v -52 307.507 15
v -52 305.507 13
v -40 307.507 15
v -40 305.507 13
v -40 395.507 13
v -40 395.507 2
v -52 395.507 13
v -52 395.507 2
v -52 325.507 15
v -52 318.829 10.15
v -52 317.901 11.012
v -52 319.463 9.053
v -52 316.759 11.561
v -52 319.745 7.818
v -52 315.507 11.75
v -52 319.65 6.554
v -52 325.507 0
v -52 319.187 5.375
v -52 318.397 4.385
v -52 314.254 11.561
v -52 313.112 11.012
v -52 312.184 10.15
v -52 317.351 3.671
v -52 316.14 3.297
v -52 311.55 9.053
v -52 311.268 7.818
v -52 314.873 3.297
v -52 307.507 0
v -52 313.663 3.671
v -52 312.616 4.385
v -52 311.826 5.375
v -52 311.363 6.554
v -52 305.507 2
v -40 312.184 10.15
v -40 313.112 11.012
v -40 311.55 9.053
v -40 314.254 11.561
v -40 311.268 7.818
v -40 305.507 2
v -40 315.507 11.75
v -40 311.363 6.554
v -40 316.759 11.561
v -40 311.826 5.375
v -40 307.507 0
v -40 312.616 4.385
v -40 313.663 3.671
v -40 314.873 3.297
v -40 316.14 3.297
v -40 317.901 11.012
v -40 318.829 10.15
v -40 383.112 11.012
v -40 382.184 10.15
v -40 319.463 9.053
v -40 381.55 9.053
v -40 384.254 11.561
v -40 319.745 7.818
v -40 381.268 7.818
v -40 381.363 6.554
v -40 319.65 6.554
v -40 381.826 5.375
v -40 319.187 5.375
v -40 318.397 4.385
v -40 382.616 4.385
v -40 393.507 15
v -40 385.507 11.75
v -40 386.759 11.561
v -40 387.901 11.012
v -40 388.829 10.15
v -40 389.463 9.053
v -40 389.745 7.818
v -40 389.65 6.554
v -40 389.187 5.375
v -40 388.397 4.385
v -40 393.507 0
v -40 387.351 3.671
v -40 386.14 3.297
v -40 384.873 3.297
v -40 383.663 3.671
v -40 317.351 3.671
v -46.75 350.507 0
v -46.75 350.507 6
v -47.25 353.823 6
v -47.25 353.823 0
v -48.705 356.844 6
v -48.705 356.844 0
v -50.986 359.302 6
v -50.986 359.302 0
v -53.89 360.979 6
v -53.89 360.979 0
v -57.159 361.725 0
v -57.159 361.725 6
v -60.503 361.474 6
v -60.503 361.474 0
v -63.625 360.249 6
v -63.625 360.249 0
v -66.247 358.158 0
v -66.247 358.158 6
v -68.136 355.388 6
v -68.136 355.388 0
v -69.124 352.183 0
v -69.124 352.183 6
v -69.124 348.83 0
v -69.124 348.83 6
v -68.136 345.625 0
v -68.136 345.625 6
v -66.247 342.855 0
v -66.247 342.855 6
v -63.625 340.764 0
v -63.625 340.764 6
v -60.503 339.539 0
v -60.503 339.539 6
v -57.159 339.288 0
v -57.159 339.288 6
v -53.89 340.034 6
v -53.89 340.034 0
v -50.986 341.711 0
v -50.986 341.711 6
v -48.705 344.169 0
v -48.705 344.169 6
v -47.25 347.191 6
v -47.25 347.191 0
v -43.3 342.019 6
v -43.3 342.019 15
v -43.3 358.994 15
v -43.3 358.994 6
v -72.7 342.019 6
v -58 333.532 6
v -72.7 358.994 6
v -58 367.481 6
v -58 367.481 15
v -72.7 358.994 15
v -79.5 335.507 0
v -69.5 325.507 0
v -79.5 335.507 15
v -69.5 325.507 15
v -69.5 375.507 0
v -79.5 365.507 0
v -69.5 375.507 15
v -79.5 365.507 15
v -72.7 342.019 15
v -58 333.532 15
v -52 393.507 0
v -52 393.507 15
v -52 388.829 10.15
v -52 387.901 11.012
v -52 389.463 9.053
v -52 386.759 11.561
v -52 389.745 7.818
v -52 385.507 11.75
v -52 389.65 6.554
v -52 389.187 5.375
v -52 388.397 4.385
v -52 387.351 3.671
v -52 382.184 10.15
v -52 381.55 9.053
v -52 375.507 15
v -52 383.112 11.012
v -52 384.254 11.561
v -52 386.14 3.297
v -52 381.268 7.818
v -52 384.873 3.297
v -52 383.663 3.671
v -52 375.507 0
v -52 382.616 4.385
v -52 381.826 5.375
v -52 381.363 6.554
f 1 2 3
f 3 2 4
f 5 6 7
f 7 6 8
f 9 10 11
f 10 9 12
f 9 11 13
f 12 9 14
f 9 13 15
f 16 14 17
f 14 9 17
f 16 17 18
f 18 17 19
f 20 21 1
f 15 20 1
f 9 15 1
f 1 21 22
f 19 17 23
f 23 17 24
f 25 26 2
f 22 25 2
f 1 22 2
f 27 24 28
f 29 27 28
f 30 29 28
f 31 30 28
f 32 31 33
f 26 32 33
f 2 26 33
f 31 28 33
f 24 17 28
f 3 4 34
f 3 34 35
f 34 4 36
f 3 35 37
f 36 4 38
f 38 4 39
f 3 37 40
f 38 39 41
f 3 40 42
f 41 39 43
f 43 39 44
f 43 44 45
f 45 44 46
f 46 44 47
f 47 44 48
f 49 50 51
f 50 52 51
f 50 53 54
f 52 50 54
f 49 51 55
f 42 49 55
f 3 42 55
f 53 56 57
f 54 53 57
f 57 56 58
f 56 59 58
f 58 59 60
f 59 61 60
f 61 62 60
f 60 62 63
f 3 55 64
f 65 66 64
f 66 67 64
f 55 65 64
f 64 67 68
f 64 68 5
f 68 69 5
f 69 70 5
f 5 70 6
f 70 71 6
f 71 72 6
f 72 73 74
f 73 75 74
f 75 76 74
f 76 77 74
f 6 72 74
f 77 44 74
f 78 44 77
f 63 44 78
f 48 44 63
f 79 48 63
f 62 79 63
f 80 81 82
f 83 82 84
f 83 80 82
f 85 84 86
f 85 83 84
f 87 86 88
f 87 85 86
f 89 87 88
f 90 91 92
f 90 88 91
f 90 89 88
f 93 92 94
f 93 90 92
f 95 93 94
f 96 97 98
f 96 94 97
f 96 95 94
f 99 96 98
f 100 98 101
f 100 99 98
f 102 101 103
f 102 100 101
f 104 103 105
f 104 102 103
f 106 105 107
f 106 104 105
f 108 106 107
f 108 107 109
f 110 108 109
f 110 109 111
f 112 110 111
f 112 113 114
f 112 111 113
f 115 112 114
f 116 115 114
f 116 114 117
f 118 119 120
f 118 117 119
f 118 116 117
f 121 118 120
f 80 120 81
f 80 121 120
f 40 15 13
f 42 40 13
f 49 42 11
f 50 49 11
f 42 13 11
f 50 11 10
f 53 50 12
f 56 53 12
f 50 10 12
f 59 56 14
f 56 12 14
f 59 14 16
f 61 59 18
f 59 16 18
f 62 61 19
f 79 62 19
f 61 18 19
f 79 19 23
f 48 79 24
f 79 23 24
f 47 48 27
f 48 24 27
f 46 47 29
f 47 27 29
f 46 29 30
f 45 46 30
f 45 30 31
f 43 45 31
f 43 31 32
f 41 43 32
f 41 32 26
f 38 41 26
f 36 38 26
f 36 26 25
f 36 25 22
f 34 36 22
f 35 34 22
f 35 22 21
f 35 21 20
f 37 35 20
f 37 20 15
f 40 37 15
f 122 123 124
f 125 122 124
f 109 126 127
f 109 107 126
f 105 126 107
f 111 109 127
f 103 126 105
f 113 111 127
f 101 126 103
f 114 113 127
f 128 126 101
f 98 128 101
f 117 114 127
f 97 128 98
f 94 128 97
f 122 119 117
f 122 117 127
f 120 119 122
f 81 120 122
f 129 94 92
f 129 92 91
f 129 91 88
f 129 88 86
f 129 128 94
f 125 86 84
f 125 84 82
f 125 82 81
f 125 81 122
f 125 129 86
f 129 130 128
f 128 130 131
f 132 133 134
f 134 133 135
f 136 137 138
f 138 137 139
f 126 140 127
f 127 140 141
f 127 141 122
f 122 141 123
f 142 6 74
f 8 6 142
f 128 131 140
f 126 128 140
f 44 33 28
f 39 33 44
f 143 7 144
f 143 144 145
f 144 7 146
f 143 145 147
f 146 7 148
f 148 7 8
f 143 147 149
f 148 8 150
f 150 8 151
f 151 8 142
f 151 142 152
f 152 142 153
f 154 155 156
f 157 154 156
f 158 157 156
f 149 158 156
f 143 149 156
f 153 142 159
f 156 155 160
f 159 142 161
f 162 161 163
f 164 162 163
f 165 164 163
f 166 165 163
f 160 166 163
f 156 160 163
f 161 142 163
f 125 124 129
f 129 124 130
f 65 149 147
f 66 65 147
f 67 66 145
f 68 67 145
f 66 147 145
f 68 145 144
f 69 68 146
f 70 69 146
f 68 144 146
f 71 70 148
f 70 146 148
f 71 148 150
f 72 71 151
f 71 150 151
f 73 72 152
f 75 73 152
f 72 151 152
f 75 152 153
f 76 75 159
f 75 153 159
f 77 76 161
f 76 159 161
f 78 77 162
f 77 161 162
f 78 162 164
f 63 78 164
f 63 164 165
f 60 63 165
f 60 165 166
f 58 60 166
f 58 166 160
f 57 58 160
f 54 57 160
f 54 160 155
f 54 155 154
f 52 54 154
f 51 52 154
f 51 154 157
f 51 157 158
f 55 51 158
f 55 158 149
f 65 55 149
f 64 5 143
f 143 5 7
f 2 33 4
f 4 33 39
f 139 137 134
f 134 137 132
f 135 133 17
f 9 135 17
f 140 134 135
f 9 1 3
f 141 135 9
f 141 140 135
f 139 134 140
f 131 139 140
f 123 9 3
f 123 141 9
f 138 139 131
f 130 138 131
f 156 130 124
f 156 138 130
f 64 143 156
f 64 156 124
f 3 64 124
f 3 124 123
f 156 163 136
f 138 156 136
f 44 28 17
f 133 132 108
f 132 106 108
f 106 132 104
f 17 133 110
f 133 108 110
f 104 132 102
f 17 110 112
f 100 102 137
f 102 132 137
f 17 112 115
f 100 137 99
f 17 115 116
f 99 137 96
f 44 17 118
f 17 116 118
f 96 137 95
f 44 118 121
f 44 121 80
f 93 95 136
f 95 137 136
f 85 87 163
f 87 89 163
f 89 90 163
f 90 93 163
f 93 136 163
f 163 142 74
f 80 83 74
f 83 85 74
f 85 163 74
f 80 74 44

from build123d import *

# Parameters (mm, degrees)
SKETCH_1_R          = 11.25
EXTRUDE_1_DEPTH     = 15
CHAMFER_1_SIZE      = 10
SKETCH_2_R          = 4.25
CUT_EXTRUDE_1_DEPTH = 397.745051815
CUT_EXTRUDE_2_DEPTH = 9
CHAMFER_2_SIZE      = 2


with BuildPart() as part:
    # 草图1 → 凸台-拉伸1 (new body)
    with BuildSketch(Plane.XY):
        Polygon((-52, 375.506526422), (-79.499521759, 375.506526422), (-79.499521759, 325.506526422), (-52, 325.506526422), (-52, 305.506526422), (-40, 305.506526422), (-40, 395.506526422), (-52, 395.506526422), align=None)
        with Locations((-58, 350.506526422)):
            Circle(SKETCH_1_R, mode=Mode.SUBTRACT)
    extrude(amount=EXTRUDE_1_DEPTH)

    # 倒角1
    chamfer_1_edges = [part.edges().sort_by_distance(p)[0] for p in [
        (-79.499521759, 375.506526422, 7.5),
        (-79.499521759, 325.506526422, 7.5),
    ]]
    chamfer(chamfer_1_edges, length=CHAMFER_1_SIZE)

    # 草图2 → 切除-拉伸1 (cut, through all)
    with BuildSketch(Plane.ZY.offset(52)):
        with Locations((7.5, 385.506526422)):
            Circle(SKETCH_2_R)
        with Locations((7.5, 315.506526422)):
            Circle(SKETCH_2_R)
    extrude(amount=-CUT_EXTRUDE_1_DEPTH, mode=Mode.SUBTRACT)

    # 草图3 → 切除-拉伸2 (cut)
    with BuildSketch(Plane.XY.offset(15)):
        Polygon((-58, 367.480624336), (-72.7, 358.993575379), (-72.7, 342.019477465), (-58, 333.532428508), (-43.3, 342.019477465), (-43.3, 358.993575379), align=None)
    extrude(amount=-CUT_EXTRUDE_2_DEPTH, mode=Mode.SUBTRACT)

    # 倒角2
    chamfer_2_edges = [part.edges().sort_by_distance(p)[0] for p in [
        (-46, 305.506526422, 15),
        (-46, 395.506526422, 15),
        (-46, 395.506526422, 0),
        (-46, 305.506526422, 0),
    ]]
    chamfer(chamfer_2_edges, length=CHAMFER_2_SIZE)


solid = part.part
